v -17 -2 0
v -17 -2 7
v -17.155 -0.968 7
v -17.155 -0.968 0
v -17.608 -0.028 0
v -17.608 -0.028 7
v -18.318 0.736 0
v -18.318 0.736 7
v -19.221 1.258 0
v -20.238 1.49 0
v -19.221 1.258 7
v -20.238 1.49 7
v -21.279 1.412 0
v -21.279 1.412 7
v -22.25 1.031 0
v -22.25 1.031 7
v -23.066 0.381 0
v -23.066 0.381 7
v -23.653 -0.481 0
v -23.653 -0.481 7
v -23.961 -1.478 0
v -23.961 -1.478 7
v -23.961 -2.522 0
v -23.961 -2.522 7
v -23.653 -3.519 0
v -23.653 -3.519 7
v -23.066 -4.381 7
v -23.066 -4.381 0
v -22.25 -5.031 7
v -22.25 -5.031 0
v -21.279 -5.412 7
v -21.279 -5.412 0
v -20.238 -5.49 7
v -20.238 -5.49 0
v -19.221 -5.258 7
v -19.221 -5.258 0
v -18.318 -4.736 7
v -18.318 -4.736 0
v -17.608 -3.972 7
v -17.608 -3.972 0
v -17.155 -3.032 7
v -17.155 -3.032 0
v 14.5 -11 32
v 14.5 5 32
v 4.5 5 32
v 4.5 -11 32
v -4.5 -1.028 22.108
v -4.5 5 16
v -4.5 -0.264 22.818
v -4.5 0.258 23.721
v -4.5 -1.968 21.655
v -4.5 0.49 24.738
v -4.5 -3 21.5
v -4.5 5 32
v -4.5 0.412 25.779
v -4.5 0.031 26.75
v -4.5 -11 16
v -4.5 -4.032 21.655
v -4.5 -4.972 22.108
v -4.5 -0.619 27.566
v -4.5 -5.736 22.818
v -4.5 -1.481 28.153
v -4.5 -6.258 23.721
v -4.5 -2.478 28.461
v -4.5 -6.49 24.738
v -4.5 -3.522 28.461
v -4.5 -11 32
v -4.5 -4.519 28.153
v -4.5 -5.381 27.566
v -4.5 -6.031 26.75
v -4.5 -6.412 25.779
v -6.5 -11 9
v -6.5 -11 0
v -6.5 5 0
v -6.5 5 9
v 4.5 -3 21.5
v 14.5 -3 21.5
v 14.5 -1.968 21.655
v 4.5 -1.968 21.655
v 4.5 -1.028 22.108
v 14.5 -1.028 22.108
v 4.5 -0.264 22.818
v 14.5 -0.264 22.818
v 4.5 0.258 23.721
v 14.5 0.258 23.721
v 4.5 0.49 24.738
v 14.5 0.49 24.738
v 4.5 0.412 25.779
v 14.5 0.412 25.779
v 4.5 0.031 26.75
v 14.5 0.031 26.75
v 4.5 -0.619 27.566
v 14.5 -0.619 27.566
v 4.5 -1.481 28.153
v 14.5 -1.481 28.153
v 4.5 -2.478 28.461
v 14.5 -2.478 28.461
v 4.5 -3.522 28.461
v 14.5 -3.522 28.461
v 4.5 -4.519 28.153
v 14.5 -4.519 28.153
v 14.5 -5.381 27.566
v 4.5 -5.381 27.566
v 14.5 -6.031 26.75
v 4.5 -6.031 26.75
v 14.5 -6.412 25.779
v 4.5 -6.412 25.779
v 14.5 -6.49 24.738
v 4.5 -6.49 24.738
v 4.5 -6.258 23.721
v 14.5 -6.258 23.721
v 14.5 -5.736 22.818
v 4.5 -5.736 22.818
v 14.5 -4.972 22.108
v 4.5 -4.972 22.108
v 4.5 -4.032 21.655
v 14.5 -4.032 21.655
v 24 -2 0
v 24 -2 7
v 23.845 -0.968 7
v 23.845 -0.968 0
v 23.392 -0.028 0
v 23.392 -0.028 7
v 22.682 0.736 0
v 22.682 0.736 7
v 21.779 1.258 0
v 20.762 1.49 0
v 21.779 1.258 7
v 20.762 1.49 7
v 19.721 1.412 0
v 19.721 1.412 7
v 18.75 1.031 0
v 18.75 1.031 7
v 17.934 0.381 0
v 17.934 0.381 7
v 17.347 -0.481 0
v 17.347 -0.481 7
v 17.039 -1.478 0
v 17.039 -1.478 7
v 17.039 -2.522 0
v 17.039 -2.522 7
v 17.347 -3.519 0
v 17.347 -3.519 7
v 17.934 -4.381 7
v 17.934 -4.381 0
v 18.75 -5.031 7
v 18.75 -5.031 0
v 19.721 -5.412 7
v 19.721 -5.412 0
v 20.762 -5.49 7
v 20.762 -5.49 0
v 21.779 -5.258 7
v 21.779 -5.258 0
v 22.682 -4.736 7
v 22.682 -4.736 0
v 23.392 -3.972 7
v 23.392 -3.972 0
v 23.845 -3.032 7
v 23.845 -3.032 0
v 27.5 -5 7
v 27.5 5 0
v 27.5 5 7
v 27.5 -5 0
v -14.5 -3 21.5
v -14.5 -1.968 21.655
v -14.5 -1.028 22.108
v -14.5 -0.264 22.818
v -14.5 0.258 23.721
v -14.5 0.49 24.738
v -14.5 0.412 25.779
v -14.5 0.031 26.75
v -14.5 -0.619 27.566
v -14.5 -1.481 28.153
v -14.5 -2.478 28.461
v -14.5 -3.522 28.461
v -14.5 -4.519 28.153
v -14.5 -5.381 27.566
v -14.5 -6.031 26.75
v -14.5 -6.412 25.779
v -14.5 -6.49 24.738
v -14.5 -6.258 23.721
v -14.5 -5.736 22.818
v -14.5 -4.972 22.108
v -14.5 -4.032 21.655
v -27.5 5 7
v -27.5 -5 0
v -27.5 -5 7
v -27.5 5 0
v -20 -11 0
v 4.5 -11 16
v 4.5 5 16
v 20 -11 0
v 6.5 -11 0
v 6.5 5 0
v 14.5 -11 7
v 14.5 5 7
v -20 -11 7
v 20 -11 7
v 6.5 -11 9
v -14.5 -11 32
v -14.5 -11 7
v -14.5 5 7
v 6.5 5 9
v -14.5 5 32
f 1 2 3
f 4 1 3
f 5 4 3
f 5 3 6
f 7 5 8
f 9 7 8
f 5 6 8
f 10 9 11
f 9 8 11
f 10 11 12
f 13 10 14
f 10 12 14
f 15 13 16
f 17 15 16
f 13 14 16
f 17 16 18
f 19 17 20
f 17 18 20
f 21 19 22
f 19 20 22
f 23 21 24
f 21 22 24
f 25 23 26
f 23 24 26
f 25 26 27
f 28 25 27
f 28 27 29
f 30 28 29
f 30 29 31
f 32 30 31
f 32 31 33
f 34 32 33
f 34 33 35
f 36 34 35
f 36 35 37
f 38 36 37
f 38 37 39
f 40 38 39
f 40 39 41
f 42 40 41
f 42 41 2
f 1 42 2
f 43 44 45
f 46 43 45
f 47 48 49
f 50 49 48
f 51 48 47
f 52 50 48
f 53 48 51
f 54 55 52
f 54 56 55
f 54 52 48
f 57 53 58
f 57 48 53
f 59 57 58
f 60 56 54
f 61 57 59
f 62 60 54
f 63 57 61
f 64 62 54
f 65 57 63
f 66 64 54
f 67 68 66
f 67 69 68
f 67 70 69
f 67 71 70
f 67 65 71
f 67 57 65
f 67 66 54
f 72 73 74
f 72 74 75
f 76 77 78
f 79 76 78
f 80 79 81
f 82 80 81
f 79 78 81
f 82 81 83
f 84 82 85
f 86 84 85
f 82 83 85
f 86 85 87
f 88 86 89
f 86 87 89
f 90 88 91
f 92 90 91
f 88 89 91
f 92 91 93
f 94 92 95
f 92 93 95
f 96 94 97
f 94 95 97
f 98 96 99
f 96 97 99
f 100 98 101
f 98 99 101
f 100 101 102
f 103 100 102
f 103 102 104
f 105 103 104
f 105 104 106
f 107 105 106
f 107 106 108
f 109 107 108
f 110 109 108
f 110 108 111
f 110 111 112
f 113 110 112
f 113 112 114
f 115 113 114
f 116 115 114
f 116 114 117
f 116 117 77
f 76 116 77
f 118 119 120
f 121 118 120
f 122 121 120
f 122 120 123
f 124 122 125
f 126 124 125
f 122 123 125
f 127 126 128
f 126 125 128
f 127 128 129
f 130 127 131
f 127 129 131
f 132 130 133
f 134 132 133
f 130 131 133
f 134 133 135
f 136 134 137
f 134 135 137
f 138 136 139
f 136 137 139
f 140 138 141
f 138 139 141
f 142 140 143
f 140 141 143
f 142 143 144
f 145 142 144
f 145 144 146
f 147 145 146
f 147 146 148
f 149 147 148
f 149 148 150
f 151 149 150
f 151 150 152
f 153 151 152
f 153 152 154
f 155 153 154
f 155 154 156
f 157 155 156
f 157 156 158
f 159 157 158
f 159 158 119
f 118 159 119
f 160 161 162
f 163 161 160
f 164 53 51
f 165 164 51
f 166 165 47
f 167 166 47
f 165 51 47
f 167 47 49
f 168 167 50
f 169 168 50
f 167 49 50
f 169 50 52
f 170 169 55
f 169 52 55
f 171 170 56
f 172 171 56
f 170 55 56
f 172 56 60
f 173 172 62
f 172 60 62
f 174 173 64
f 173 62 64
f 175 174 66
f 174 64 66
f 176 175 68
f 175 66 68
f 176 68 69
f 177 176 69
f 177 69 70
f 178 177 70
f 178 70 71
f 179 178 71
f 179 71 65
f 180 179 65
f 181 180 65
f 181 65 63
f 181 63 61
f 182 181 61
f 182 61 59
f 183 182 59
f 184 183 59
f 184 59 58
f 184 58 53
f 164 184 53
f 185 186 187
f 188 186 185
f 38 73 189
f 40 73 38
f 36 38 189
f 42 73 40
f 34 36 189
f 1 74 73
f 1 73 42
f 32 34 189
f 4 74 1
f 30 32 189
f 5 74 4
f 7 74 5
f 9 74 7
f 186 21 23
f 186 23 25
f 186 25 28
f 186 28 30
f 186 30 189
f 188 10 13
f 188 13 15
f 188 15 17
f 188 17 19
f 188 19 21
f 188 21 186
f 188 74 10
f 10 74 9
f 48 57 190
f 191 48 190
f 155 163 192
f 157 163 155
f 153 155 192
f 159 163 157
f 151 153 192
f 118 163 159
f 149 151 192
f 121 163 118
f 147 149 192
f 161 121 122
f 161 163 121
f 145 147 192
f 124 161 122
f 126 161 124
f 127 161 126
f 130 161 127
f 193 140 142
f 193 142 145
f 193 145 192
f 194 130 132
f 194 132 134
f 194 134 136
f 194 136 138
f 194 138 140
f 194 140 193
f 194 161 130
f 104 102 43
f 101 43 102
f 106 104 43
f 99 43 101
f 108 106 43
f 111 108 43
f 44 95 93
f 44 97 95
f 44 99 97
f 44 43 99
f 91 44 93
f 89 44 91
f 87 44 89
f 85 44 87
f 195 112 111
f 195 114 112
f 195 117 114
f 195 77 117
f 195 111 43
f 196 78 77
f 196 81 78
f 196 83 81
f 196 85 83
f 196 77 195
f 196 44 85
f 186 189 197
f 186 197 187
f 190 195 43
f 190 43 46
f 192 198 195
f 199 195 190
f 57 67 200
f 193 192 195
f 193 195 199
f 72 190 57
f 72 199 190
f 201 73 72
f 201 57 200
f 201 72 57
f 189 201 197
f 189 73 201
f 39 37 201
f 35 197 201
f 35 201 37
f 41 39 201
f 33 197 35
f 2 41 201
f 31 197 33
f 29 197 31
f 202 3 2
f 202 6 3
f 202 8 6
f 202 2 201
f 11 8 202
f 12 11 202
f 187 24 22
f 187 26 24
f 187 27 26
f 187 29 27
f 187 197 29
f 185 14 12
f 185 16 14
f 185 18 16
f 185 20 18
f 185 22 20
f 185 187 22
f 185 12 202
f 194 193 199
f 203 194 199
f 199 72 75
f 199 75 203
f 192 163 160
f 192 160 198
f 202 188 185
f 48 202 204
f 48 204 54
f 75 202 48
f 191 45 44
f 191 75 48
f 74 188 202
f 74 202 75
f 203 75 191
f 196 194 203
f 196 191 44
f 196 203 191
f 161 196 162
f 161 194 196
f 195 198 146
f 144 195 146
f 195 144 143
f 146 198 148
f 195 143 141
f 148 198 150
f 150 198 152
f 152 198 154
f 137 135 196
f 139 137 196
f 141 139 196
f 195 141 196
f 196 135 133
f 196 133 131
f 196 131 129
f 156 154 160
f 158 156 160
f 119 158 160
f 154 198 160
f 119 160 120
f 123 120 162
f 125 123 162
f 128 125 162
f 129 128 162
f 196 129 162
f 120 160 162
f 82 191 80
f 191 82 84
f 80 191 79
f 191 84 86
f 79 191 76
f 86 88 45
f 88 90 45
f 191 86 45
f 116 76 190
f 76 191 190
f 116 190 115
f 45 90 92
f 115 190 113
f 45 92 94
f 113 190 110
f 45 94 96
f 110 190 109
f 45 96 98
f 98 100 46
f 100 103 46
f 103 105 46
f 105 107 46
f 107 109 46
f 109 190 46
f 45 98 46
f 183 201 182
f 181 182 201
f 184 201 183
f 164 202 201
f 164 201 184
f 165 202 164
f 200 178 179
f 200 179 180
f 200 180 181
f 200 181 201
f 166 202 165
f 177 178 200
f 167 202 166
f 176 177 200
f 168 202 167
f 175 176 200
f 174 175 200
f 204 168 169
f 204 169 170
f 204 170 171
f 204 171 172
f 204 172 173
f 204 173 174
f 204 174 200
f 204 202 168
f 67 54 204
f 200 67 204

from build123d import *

# Parameters (mm, degrees)
SALIENTE_EXTRUIR1_DEPTH = 32
CROQUIS3_W              = 28.149246734
CROQUIS3_H              = 33.455515618
CORTAR_EXTRUIR1_DEPTH   = 13
CROQUIS4_W              = 32.272758708
CROQUIS4_H              = 29.27783323
CORTAR_EXTRUIR2_DEPTH   = 13
CROQUIS5_W              = 13
CROQUIS5_H              = 9
CORTAR_EXTRUIR3_DEPTH   = 17
CROQUIS6_W              = 9
CROQUIS6_H              = 23
CORTAR_EXTRUIR4_DEPTH   = 17
CROQUIS7_R              = 3.5
CORTAR_EXTRUIR5_DEPTH   = 43
CROQUIS9_R              = 3.5
CORTAR_EXTRUIR6_DEPTH   = 8


with BuildPart() as part:
    # Croquis1 → Saliente-Extruir1 (new body)
    with BuildSketch(Plane.XY):
        Polygon((-20, -11), (-27.5, -5), (-27.5, 5), (27.5, 5), (27.5, -5), (20, -11), align=None)
    extrude(amount=SALIENTE_EXTRUIR1_DEPTH)

    # Croquis3 → Cortar-Extruir1 (cut)
    with BuildSketch(Plane(origin=(27.5, 0, 0), x_dir=(0, 0, -1), z_dir=(1, 0, 0))):
        with Locations((-21.074623367, 0)):
            Rectangle(CROQUIS3_W, CROQUIS3_H)
    extrude(amount=-CORTAR_EXTRUIR1_DEPTH, mode=Mode.SUBTRACT)

    # Croquis4 → Cortar-Extruir2 (cut)
    with BuildSketch(Plane.ZY.offset(27.5)):
        with Locations((23.136379354, -3.846869201)):
            Rectangle(CROQUIS4_W, CROQUIS4_H)
    extrude(amount=-CORTAR_EXTRUIR2_DEPTH, mode=Mode.SUBTRACT)

    # Croquis5 → Cortar-Extruir3 (cut, through all)
    with BuildSketch(Plane.XZ.offset(11)):
        with Locations((0, 4.5)):
            Rectangle(CROQUIS5_W, CROQUIS5_H)
    extrude(amount=-CORTAR_EXTRUIR3_DEPTH, mode=Mode.SUBTRACT)

    # Croquis6 → Cortar-Extruir4 (cut, through all)
    with BuildSketch(Plane.XZ.offset(11)):
        with Locations((0, 27.5)):
            Rectangle(CROQUIS6_W, CROQUIS6_H)
    extrude(amount=-CORTAR_EXTRUIR4_DEPTH, mode=Mode.SUBTRACT)

    # Croquis7 → Cortar-Extruir5 (cut, through all)
    with BuildSketch(Plane(origin=(14.5, 0, 0), x_dir=(0, 0, -1), z_dir=(1, 0, 0))):
        with Locations((-25, -3)):
            Circle(CROQUIS7_R)
    extrude(amount=-CORTAR_EXTRUIR5_DEPTH, mode=Mode.SUBTRACT)

    # Croquis9 → Cortar-Extruir6 (cut, through all)
    with BuildSketch(Plane.XY.offset(7)):
        with Locations((20.5, -2)):
            Circle(CROQUIS9_R)
        with Locations((-20.5, -2)):
            Circle(CROQUIS9_R)
    extrude(amount=-CORTAR_EXTRUIR6_DEPTH, mode=Mode.SUBTRACT)


solid = part.part
